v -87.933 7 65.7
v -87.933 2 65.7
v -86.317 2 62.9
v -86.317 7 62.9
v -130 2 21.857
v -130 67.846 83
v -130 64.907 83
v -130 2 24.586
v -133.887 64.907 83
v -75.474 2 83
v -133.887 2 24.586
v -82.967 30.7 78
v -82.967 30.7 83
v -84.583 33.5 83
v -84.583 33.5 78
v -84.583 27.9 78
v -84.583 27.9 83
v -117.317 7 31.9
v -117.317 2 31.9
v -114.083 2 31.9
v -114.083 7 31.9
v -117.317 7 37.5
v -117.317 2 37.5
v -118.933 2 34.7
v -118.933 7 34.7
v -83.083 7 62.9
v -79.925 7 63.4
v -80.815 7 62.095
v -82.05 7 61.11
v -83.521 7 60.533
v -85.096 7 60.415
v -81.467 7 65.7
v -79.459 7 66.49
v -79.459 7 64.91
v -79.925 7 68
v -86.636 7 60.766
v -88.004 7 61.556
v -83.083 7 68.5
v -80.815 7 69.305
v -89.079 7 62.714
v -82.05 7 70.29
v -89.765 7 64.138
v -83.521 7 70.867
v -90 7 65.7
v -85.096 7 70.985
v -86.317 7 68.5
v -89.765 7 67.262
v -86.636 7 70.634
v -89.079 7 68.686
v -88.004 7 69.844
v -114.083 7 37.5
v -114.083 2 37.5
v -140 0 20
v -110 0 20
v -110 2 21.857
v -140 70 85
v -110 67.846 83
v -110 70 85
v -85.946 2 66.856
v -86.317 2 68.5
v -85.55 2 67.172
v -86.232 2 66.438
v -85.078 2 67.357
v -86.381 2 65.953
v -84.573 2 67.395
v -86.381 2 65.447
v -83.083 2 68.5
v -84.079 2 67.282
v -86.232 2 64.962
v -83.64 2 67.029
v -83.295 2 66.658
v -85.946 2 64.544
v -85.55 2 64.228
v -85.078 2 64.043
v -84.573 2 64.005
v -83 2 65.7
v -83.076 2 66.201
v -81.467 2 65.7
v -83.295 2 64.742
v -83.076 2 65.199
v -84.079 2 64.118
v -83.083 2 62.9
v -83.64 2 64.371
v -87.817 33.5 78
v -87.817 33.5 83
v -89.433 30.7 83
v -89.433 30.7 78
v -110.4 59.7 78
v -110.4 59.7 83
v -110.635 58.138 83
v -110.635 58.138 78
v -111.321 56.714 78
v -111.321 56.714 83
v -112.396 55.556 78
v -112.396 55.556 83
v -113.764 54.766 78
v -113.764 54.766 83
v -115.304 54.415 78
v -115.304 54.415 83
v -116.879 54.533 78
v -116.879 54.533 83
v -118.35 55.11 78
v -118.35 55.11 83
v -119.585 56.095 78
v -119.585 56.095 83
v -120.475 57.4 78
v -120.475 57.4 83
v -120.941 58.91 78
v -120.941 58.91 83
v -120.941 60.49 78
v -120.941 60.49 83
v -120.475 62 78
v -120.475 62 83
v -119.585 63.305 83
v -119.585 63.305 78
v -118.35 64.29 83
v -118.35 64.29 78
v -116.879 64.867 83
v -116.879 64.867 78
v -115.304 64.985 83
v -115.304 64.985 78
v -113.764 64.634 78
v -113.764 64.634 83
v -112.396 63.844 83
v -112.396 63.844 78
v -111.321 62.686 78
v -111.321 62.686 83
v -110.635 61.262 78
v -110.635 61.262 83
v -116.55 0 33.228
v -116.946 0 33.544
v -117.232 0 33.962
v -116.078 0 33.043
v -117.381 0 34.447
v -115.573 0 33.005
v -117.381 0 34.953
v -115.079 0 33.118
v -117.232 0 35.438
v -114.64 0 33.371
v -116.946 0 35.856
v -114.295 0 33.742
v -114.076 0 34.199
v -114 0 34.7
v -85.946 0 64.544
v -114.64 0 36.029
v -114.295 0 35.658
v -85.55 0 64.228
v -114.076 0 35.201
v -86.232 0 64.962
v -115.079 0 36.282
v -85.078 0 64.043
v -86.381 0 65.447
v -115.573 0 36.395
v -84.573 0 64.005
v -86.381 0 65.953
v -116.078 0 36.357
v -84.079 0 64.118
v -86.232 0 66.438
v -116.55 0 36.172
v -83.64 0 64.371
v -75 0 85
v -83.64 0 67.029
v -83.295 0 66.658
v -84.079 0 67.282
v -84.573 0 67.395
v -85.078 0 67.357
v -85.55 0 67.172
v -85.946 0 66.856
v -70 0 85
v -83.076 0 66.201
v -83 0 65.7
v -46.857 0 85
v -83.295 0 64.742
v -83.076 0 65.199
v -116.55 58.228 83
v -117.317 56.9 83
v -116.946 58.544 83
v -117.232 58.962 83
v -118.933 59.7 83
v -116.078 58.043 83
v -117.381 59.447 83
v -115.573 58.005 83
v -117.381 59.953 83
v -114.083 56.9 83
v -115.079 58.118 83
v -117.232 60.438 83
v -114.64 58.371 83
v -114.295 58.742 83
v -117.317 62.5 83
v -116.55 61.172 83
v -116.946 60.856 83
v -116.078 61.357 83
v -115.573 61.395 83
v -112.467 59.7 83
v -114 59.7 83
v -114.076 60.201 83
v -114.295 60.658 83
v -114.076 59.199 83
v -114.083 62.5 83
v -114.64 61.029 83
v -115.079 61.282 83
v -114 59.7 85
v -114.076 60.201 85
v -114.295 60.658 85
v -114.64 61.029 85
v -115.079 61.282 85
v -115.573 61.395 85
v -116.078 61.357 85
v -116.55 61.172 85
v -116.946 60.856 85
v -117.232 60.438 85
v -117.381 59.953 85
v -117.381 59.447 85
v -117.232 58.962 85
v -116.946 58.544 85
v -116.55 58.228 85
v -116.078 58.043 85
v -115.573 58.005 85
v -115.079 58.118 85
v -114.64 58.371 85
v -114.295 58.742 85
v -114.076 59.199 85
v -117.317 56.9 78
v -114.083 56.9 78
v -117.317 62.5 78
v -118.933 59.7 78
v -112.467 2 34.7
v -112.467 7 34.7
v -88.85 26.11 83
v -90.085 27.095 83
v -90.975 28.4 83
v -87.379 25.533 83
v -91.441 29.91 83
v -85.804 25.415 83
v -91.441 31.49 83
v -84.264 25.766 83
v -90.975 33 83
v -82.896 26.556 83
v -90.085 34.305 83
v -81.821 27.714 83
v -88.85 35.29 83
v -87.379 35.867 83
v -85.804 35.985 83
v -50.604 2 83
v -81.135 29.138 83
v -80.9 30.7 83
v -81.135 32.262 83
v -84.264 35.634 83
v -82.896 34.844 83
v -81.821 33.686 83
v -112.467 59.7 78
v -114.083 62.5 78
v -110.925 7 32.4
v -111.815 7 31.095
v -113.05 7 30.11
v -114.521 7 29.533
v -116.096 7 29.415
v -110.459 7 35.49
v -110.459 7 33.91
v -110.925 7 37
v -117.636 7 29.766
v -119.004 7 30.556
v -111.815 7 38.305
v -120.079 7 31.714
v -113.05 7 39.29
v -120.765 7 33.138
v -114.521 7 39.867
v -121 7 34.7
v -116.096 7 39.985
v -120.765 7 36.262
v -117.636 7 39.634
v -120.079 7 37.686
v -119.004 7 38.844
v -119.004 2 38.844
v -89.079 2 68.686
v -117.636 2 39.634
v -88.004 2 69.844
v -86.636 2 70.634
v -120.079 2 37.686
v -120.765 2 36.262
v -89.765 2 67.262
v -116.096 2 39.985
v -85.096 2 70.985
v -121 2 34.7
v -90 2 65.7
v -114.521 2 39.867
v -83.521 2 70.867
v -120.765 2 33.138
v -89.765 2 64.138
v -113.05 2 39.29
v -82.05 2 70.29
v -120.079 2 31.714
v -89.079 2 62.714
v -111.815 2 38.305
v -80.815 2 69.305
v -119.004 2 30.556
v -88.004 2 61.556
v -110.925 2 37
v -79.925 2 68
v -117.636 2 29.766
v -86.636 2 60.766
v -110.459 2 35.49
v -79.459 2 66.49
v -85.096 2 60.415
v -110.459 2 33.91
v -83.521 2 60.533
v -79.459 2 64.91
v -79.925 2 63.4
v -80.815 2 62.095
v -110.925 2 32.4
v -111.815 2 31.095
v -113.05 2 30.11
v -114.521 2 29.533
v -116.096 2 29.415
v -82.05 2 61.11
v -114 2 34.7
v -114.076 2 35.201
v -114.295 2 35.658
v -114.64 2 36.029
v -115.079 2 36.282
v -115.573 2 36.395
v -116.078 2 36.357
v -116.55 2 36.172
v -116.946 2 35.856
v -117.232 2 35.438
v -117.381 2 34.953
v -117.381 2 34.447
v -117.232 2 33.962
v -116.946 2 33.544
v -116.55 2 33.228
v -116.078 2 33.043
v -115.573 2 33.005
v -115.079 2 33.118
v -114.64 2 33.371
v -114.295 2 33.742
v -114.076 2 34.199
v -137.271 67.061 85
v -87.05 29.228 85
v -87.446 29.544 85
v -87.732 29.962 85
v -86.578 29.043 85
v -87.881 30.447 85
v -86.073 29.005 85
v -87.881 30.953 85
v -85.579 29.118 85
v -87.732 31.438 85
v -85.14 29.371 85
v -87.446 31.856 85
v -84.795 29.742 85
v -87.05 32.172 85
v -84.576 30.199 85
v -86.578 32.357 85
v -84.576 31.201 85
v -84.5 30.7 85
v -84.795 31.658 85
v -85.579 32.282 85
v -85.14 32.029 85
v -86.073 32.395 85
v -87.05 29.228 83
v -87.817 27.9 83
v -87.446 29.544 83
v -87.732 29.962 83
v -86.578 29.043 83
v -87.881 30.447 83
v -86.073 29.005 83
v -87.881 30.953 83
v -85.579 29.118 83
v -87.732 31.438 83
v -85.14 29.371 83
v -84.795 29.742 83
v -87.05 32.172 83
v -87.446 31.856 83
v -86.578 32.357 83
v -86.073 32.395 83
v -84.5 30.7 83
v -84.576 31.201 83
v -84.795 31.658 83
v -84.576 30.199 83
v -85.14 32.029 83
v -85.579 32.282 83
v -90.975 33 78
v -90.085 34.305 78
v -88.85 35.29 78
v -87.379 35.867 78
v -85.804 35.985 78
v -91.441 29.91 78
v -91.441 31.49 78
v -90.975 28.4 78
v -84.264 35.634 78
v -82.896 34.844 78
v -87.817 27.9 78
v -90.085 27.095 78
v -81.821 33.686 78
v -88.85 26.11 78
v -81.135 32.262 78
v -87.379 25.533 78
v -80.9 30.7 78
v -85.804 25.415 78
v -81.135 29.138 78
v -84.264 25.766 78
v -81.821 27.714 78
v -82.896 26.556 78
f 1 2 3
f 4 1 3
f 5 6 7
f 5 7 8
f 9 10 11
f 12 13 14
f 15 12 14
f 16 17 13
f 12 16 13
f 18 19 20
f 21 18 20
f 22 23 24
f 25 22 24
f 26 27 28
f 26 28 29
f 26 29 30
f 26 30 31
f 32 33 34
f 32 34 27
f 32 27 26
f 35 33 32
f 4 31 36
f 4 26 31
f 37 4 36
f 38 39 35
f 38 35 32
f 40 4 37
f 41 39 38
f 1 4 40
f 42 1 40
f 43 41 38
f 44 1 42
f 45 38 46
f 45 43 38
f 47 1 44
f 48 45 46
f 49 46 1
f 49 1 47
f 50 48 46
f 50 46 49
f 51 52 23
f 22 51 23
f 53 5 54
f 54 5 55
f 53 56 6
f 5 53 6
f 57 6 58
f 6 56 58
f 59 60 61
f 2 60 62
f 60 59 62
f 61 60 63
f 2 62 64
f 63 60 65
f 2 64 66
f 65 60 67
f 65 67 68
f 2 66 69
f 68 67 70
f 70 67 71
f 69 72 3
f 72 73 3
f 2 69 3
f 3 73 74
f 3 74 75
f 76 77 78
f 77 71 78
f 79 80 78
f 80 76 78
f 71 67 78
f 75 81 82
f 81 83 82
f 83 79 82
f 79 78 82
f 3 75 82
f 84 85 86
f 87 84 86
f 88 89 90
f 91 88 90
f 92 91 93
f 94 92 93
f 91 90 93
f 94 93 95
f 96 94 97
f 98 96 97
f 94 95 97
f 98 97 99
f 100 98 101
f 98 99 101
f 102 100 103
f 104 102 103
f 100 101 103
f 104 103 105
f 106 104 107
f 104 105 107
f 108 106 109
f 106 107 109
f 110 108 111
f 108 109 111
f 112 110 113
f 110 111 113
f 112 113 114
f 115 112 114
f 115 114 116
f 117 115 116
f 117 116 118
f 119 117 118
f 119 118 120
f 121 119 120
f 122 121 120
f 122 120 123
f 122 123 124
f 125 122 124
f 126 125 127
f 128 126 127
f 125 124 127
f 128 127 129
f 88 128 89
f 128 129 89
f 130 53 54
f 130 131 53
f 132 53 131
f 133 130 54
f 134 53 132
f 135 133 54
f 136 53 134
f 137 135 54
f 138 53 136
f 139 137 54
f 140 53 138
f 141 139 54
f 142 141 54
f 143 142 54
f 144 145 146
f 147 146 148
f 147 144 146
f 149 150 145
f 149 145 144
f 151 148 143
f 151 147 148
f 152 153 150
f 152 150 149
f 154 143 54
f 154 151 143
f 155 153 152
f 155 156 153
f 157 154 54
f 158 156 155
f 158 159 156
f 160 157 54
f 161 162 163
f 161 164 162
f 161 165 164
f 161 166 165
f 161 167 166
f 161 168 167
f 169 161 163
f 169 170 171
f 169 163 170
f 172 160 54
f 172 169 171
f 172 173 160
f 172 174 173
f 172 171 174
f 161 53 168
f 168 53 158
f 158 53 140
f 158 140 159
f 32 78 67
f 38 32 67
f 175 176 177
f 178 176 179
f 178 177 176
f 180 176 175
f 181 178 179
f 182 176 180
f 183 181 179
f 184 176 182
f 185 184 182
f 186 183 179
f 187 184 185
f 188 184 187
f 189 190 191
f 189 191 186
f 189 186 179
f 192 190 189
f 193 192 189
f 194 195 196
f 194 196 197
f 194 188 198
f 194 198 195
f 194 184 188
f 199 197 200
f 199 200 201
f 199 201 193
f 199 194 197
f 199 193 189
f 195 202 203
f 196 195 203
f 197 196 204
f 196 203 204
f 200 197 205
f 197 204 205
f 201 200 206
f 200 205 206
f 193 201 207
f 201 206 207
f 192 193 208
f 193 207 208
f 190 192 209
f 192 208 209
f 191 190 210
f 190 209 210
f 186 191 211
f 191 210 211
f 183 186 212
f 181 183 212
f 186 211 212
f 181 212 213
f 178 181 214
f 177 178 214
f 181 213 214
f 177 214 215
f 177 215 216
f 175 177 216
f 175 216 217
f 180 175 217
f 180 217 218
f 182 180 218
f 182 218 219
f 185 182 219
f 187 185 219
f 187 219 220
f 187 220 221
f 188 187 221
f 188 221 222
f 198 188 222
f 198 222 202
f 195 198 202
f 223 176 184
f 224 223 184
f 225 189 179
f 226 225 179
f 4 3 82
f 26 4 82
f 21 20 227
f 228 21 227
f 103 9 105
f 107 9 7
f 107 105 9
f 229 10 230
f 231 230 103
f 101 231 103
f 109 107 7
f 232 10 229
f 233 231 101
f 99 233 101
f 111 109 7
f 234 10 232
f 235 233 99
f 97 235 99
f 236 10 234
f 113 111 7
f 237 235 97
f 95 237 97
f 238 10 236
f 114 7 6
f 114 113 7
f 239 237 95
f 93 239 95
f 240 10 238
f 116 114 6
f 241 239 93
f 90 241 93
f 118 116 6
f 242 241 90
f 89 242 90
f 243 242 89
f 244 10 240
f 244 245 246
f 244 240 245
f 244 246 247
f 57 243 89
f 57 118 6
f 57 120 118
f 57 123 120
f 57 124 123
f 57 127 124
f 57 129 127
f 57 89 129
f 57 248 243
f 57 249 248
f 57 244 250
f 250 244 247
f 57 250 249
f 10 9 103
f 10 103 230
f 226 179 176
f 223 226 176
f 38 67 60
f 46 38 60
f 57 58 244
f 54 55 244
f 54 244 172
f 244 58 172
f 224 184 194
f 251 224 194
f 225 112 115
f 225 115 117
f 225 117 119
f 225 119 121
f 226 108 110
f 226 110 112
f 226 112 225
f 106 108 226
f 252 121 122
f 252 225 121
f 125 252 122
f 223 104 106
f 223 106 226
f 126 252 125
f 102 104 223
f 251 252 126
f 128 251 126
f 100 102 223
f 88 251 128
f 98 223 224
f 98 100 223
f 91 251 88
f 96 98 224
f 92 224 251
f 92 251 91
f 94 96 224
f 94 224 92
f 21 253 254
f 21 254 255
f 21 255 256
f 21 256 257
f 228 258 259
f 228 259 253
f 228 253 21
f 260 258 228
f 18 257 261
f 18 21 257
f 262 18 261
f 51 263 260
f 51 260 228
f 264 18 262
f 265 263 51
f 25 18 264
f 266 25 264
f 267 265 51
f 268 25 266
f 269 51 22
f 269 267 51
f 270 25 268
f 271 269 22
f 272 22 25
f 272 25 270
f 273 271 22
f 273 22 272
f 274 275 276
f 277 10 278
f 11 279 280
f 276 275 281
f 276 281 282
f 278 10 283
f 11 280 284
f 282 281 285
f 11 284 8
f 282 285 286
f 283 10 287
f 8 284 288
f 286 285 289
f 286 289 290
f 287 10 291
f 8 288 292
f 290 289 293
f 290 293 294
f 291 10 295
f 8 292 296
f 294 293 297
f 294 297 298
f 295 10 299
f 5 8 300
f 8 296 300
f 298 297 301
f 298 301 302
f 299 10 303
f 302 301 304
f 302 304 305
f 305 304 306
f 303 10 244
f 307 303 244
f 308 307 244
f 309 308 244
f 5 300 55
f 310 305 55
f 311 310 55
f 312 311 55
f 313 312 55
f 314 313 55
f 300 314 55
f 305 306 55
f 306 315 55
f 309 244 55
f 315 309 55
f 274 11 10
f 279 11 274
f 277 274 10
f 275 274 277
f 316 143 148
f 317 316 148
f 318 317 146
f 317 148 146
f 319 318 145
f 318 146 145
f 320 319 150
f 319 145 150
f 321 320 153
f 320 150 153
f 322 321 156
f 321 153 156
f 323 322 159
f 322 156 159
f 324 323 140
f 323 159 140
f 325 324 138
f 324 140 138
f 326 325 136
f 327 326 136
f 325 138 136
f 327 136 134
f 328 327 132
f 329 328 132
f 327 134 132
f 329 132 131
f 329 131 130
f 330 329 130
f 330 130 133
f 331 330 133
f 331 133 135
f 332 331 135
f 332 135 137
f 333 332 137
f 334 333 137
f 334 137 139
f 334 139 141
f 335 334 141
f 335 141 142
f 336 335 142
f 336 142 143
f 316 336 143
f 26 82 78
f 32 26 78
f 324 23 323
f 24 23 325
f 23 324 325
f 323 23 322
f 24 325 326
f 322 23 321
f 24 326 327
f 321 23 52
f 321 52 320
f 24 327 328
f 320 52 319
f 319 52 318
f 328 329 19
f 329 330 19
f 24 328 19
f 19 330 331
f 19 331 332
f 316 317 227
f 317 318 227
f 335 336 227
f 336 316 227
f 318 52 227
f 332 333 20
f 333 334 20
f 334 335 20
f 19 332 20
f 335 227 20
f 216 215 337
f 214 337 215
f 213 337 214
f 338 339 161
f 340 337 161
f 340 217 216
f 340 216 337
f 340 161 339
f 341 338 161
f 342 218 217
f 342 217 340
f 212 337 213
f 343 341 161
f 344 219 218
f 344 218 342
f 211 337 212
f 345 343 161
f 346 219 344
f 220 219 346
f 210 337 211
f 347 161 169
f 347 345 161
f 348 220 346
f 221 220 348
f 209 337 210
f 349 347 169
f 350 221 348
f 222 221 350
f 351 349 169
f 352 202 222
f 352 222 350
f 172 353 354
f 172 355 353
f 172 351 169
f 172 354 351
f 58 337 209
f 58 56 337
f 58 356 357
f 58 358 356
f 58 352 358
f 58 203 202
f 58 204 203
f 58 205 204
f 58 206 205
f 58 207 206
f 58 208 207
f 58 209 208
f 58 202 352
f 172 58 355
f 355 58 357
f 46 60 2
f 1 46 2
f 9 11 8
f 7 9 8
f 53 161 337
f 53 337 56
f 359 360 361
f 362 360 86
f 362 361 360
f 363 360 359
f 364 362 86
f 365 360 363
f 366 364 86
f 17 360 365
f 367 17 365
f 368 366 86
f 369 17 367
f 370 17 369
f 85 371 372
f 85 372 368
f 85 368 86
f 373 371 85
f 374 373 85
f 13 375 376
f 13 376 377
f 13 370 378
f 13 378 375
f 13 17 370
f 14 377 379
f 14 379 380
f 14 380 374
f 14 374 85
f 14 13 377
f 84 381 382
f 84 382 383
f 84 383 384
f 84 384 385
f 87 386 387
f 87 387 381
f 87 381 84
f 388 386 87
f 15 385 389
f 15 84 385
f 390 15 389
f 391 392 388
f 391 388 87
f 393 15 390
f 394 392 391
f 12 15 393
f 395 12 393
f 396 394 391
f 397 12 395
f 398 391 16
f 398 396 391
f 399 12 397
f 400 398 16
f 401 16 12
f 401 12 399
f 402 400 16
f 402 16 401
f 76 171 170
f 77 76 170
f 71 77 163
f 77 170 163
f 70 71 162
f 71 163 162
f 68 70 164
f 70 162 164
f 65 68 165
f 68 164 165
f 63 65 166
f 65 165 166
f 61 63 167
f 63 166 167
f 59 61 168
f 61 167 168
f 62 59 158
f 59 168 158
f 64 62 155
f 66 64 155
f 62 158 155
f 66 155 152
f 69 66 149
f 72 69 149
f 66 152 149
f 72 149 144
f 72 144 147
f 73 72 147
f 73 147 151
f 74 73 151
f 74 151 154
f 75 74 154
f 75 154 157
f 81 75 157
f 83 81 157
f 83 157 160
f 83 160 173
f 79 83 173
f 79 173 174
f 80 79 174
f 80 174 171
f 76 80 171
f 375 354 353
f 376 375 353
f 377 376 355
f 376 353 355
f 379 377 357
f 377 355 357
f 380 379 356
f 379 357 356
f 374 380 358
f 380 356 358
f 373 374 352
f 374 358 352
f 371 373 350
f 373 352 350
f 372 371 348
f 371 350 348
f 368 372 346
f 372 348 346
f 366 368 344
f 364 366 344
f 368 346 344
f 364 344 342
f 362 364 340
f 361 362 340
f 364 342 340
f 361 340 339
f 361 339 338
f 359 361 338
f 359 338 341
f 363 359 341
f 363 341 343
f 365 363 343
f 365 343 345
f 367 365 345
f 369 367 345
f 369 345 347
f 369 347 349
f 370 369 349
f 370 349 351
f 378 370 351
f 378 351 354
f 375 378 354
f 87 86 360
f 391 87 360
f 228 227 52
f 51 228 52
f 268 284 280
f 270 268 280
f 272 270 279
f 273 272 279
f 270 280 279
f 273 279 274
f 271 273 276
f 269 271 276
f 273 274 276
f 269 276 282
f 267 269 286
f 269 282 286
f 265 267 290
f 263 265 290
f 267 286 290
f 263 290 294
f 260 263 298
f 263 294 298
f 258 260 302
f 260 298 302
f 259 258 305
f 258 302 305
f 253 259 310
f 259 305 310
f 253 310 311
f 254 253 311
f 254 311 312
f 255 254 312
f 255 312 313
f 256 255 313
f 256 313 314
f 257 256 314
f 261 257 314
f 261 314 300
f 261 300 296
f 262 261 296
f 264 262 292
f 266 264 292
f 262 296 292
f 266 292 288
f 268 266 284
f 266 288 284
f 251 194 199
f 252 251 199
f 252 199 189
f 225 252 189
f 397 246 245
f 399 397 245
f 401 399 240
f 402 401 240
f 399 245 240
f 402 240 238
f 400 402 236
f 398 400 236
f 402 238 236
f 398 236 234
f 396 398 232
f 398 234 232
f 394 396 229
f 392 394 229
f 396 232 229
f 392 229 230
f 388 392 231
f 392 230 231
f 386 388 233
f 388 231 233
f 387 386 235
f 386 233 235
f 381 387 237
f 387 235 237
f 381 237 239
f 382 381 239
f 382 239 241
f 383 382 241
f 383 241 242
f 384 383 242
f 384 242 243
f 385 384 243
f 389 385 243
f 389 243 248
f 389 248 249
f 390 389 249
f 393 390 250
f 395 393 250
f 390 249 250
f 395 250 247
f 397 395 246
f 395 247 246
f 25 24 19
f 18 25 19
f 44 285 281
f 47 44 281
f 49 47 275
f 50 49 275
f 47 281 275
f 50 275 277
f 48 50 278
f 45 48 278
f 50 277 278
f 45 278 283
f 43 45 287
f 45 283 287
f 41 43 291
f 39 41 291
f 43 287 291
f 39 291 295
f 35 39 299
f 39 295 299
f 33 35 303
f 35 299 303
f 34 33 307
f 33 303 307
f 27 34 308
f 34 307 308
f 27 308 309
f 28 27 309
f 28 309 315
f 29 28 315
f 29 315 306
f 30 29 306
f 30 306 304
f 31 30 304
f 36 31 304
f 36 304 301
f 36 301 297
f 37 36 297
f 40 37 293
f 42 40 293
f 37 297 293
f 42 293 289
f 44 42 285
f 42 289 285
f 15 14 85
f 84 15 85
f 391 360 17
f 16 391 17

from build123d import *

# Parameters (mm, degrees)
F1_DEPTH  = 5
F4_DEPTH  = 5
F7_DEPTH  = 5.42
F11_DEPTH = 2
F14_DEPTH = 2
F8_W      = 30
F8_H      = 95.5248658727
F15_DEPTH = 2
F17_DEPTH = 102.5
F18_DEPTH = 2
F19_DEPTH = 239
F22_DEPTH = 2
F25_DEPTH = 25
F27_W     = 101.7516627908
F27_H     = 74.3317976594
F28_DEPTH = 25
F30_W     = 3.562554135
F30_H     = 2.8552263975
F31_DEPTH = 25
F33_W     = 167.9849326611
F33_H     = 135.5820912868
F34_DEPTH = 25
F35_DEPTH = 25
F36_DEPTH = 5
F37_DEPTH = 5
F6_W      = 160
F6_H      = 95.5248658727
F38_DEPTH = 5
F39_R     = 1.7
F40_DEPTH = 9.9
F41_DEPTH = 20
F42_R     = 1.7
F43_DEPTH = 25
F44_R     = 5.3
F45_DEPTH = 5
F46_R     = 5.3
F47_DEPTH = 5
F48_DEPTH = 154
F49_DEPTH = 5
F50_DEPTH = 5


with BuildPart() as f1:
    # F0 (on Front) → F1 (new body)
    with BuildSketch(Plane.XZ):
        Polygon((-300, 20), (-300, 0), (0, 0), (0, 175), (-30, 175), (-30, 95), (-70, 95), (-75, 90), (-75, 85), (-140, 20), align=None)
    extrude(amount=F1_DEPTH)

    # F3 (on offset) → F4 (join)
    with BuildSketch(Plane(origin=(0, 0, 85), x_dir=(1, 0, 0), z_dir=(0, 0, -1))):
        Polygon((0, -157.818160031), (0, 0), (-70, 0), (-140, -70), (-300, -70), (-300, -157.818160031), align=None)
    extrude(amount=-F4_DEPTH)



with BuildPart() as f7:
    # F0 (on Front) → F7 (new body)
    with BuildSketch(Plane.XZ):
        Polygon((-300, 20), (-300, 0), (0, 0), (0, 175), (-30, 175), (-30, 95), (-70, 95), (-75, 90), (-75, 85), (-140, 20), align=None)
    extrude(amount=F7_DEPTH)


with BuildPart() as f1_1:
    add(f1.part)

    add(f7.part)  # F11 merges F7
    # F10 (on 3pt) → F11 (join)
    with BuildSketch(Plane(origin=(-55.9001782531, -51.9073083779, 55.9001782531), x_dir=(-0.3881029321, 0.8359140076, 0.3881029321), z_dir=(0.5910804633, 0.5488604302, -0.5910804633))):
        Polygon((62.0964691388, -84.8528137424), (145.837140261, -38.8908729653), (62.0964691388, 7.0710678119), align=None)
    extrude(amount=F11_DEPTH)


with BuildPart() as f14:
    # F13 (on 3pt) → F14 (new body)
    with BuildSketch(Plane.XY.offset(85)):
        Polygon((-75, 0), (-70, 0), (-140, 70), align=None)
    extrude(amount=-F14_DEPTH)


with BuildPart() as f15:
    # F8 (on 3pt) → F15 (new body)
    with BuildSketch(Plane(origin=(0, -9.9726027397, 10.7397260274), x_dir=(1, 0, 0), z_dir=(0, 0.6804510994, -0.7327934916))):
        with Locations((-125, -61.3714549237)):
            Rectangle(F8_W, F8_H)
    extrude(amount=-F15_DEPTH)


with BuildPart() as f17_tool:
    # F17 (cut): a face of the model
    f17_faces = [f1_1.part.faces().sort_by_distance(p)[0] for p in [
        (-129.156432847, 97.5448991734, 85),
    ]]
    extrude(f17_faces, amount=-F17_DEPTH)


with BuildPart() as f1_2:
    add(f1_1.part)

    # F17: cut by f17_tool
    add(f17_tool.part, mode=Mode.SUBTRACT)


    add(f14.part)  # F18 merges F14


with BuildPart() as f15_1:
    add(f15.part)

    # F17: cut by f17_tool
    add(f17_tool.part, mode=Mode.SUBTRACT)


with BuildPart() as f1_3:
    add(f1_2.part)

    add(f15_1.part)  # F18 merges F15
    # F16 (on face) → F18 (join)
    with BuildSketch(Plane.XZ):
        Polygon((-45, 85), (-75, 85), (-140, 20), (-110, 20), align=None)
    extrude(amount=-F18_DEPTH)

    # F0 (on Front) → F19 (cut)
    with BuildSketch(Plane.XZ):
        Polygon((-300, 20), (-300, 0), (0, 0), (0, 175), (-30, 175), (-30, 95), (-70, 95), (-75, 90), (-75, 85), (-140, 20), align=None)
    extrude(amount=F19_DEPTH, mode=Mode.SUBTRACT)

    # F21 (on 3pt) → F22 (join)
    with BuildSketch(Plane(origin=(0, 0, 85), x_dir=(1, 0, 0), z_dir=(0, 0, -1))):
        Polygon((-110, -70), (-45, 0), (-75, 0), (-140, -70), align=None)
    extrude(amount=F22_DEPTH)

    # F24 (on 3pt) → F25 (cut)
    with BuildSketch(Plane(origin=(0, -9.9726027397, 10.7397260274), x_dir=(1, 0, 0), z_dir=(0, -0.6804510994, 0.7327934916))):
        Polygon((-152.044788003, 115.9684211016), (-152.044788003, 9.7816493362), (-52.4809733033, 8.1501184031), (-52.4809733033, 115.9684211016), align=None)
    extrude(amount=-F25_DEPTH, mode=Mode.SUBTRACT)

    # F27 (on 3pt) → F28 (cut)
    with BuildSketch(Plane(origin=(-55.9001782531, -51.9073083779, 55.9001782531), x_dir=(-0.3881029321, 0.8359140076, 0.3881029321), z_dir=(0.5910804633, 0.5488604302, -0.5910804633))):
        with Locations((109.982162714, -56.3623122871)):
            Rectangle(F27_W, F27_H)
    extrude(amount=-F28_DEPTH, mode=Mode.SUBTRACT)

    # F30 (on 3pt) → F31 (cut)
    with BuildSketch(Plane(origin=(-52.6598984772, 0, 3.7614213198), x_dir=(0, 1, 0), z_dir=(0.9974586998, 0, -0.07124705))):
        with Locations((1.0092993034, 80.4627463222)):
            Rectangle(F30_W, F30_H)
    extrude(amount=F31_DEPTH, mode=Mode.SUBTRACT)

    # F33 (on 3pt) → F34 (cut)
    with BuildSketch(Plane(origin=(-46.9394598514, -42.3413086823, 45.598332427), x_dir=(0.3896444557, -0.8395868317, -0.378511757), z_dir=(-0.6022183228, -0.5432255075, 0.585012085))):
        with Locations((-70.4560130835, -7.8508025035)):
            Rectangle(F33_W, F33_H)
    extrude(amount=-F34_DEPTH, mode=Mode.SUBTRACT)

    # F35 (cut): a face of the model
    f35_faces = [f1_3.faces().sort_by_distance(p)[0] for p in [
        (-138.1104971586, 68.1104971586, 85.064982902),
    ]]
    extrude(f35_faces, amount=-F35_DEPTH, mode=Mode.SUBTRACT)

    # F3 (on offset) → F36 (join)
    with BuildSketch(Plane(origin=(0, 0, 85), x_dir=(1, 0, 0), z_dir=(0, 0, -1))):
        Polygon((0, -157.818160031), (0, 0), (-70, 0), (-140, -70), (-300, -70), (-300, -157.818160031), align=None)
    extrude(amount=-F36_DEPTH)

    # F0 (on Front) → F37 (join)
    with BuildSketch(Plane.XZ):
        Polygon((-300, 20), (-300, 0), (0, 0), (0, 175), (-30, 175), (-30, 95), (-70, 95), (-75, 90), (-75, 85), (-140, 20), align=None)
    extrude(amount=F37_DEPTH)

    # F39 (on face) → F40 (cut)
    with BuildSketch(Plane.XZ.offset(5)):
        with Locations((-115.7, 34.7)):
            Circle(F39_R)
        with Locations((-84.7, 65.7)):
            Circle(F39_R)
    extrude(amount=-F40_DEPTH, mode=Mode.SUBTRACT)

    # F41 (cut): a face of the model
    f41_faces = [f1_3.faces().sort_by_distance(p)[0] for p in [
        (-110, 34.1938617489, 53.1056998046),
    ]]
    extrude(f41_faces, amount=-F41_DEPTH, mode=Mode.SUBTRACT)

    # F42 (on face) → F43 (cut)
    with BuildSketch(Plane.XY.offset(90)):
        with Locations((-86.2, 30.7)):
            Circle(F42_R)
        with Locations((-115.7, 59.7)):
            Circle(F42_R)
    extrude(amount=-F43_DEPTH, mode=Mode.SUBTRACT)

    # F44 (on face) → F45 (join)
    with BuildSketch(Plane(origin=(0, 2, 0), x_dir=(-1, 0, 0), z_dir=(0, 1, 0))):
        with Locations((115.7, 34.7)):
            Circle(F44_R)
        Polygon((118.9331615075, 34.7), (117.3165807537, 31.9), (114.0834192463, 31.9), (112.4668384925, 34.7), (114.0834192463, 37.5), (117.3165807537, 37.5), align=None, mode=Mode.SUBTRACT)
        with Locations((84.7, 65.7)):
            Circle(F44_R)
        Polygon((87.9331615075, 65.7), (86.3165807537, 62.9), (83.0834192463, 62.9), (81.4668384925, 65.7), (83.0834192463, 68.5), (86.3165807537, 68.5), align=None, mode=Mode.SUBTRACT)
    extrude(amount=F45_DEPTH)

    # F46 (on face) → F47 (join)
    with BuildSketch(Plane(origin=(0, 0, 83), x_dir=(1, 0, 0), z_dir=(0, 0, -1))):
        with Locations((-115.7, -59.7)):
            Circle(F46_R)
        Polygon((-112.4668384925, -59.7), (-114.0834192463, -62.5), (-117.3165807537, -62.5), (-118.9331615075, -59.7), (-117.3165807537, -56.9), (-114.0834192463, -56.9), align=None, mode=Mode.SUBTRACT)
        with Locations((-86.2, -30.7)):
            Circle(F46_R)
        Polygon((-82.9668384925, -30.7), (-84.5834192463, -33.5), (-87.8165807537, -33.5), (-89.4331615075, -30.7), (-87.8165807537, -27.9), (-84.5834192463, -27.9), align=None, mode=Mode.SUBTRACT)
    extrude(amount=F47_DEPTH)

    # F39 (on face) → F49 (cut)
    with BuildSketch(Plane.XZ.offset(5)):
        Polygon((-140, 20), (-300, 20), (-300, 0), (0, 0), (0, 175), (-30, 175), (-30, 95), (-70, 95), (-75, 90), (-75, 85), align=None)
        with Locations((-115.7, 34.7)):
            Circle(F39_R, mode=Mode.SUBTRACT)
        with Locations((-84.7, 65.7)):
            Circle(F39_R, mode=Mode.SUBTRACT)
    extrude(amount=-F49_DEPTH, mode=Mode.SUBTRACT)

    # F42 (on face) → F50 (cut)
    with BuildSketch(Plane.XY.offset(90)):
        Polygon((0, 0), (0, 157.818160031), (-300, 157.818160031), (-300, 70), (-140, 70), (-70, 0), align=None)
        with Locations((-86.2, 30.7)):
            Circle(F42_R, mode=Mode.SUBTRACT)
        with Locations((-115.7, 59.7)):
            Circle(F42_R, mode=Mode.SUBTRACT)
    extrude(amount=-F50_DEPTH, mode=Mode.SUBTRACT)


with BuildPart() as f38:
    # F6 (on 3pt) → F38 (new body)
    with BuildSketch(Plane(origin=(0, -9.9726027397, 10.7397260274), x_dir=(1, 0, 0), z_dir=(0, 0.6804510994, -0.7327934916))):
        with Locations((-220, -61.3714549237)):
            Rectangle(F6_W, F6_H)
    extrude(amount=F38_DEPTH)

    # F6 (on 3pt) → F48 (cut)
    with BuildSketch(Plane(origin=(0, -9.9726027397, 10.7397260274), x_dir=(1, 0, 0), z_dir=(0, 0.6804510994, -0.7327934916))):
        with Locations((-220, -61.3714549237)):
            Rectangle(F6_W, F6_H)
    extrude(amount=F48_DEPTH, mode=Mode.SUBTRACT)


solid = f1_3.part
